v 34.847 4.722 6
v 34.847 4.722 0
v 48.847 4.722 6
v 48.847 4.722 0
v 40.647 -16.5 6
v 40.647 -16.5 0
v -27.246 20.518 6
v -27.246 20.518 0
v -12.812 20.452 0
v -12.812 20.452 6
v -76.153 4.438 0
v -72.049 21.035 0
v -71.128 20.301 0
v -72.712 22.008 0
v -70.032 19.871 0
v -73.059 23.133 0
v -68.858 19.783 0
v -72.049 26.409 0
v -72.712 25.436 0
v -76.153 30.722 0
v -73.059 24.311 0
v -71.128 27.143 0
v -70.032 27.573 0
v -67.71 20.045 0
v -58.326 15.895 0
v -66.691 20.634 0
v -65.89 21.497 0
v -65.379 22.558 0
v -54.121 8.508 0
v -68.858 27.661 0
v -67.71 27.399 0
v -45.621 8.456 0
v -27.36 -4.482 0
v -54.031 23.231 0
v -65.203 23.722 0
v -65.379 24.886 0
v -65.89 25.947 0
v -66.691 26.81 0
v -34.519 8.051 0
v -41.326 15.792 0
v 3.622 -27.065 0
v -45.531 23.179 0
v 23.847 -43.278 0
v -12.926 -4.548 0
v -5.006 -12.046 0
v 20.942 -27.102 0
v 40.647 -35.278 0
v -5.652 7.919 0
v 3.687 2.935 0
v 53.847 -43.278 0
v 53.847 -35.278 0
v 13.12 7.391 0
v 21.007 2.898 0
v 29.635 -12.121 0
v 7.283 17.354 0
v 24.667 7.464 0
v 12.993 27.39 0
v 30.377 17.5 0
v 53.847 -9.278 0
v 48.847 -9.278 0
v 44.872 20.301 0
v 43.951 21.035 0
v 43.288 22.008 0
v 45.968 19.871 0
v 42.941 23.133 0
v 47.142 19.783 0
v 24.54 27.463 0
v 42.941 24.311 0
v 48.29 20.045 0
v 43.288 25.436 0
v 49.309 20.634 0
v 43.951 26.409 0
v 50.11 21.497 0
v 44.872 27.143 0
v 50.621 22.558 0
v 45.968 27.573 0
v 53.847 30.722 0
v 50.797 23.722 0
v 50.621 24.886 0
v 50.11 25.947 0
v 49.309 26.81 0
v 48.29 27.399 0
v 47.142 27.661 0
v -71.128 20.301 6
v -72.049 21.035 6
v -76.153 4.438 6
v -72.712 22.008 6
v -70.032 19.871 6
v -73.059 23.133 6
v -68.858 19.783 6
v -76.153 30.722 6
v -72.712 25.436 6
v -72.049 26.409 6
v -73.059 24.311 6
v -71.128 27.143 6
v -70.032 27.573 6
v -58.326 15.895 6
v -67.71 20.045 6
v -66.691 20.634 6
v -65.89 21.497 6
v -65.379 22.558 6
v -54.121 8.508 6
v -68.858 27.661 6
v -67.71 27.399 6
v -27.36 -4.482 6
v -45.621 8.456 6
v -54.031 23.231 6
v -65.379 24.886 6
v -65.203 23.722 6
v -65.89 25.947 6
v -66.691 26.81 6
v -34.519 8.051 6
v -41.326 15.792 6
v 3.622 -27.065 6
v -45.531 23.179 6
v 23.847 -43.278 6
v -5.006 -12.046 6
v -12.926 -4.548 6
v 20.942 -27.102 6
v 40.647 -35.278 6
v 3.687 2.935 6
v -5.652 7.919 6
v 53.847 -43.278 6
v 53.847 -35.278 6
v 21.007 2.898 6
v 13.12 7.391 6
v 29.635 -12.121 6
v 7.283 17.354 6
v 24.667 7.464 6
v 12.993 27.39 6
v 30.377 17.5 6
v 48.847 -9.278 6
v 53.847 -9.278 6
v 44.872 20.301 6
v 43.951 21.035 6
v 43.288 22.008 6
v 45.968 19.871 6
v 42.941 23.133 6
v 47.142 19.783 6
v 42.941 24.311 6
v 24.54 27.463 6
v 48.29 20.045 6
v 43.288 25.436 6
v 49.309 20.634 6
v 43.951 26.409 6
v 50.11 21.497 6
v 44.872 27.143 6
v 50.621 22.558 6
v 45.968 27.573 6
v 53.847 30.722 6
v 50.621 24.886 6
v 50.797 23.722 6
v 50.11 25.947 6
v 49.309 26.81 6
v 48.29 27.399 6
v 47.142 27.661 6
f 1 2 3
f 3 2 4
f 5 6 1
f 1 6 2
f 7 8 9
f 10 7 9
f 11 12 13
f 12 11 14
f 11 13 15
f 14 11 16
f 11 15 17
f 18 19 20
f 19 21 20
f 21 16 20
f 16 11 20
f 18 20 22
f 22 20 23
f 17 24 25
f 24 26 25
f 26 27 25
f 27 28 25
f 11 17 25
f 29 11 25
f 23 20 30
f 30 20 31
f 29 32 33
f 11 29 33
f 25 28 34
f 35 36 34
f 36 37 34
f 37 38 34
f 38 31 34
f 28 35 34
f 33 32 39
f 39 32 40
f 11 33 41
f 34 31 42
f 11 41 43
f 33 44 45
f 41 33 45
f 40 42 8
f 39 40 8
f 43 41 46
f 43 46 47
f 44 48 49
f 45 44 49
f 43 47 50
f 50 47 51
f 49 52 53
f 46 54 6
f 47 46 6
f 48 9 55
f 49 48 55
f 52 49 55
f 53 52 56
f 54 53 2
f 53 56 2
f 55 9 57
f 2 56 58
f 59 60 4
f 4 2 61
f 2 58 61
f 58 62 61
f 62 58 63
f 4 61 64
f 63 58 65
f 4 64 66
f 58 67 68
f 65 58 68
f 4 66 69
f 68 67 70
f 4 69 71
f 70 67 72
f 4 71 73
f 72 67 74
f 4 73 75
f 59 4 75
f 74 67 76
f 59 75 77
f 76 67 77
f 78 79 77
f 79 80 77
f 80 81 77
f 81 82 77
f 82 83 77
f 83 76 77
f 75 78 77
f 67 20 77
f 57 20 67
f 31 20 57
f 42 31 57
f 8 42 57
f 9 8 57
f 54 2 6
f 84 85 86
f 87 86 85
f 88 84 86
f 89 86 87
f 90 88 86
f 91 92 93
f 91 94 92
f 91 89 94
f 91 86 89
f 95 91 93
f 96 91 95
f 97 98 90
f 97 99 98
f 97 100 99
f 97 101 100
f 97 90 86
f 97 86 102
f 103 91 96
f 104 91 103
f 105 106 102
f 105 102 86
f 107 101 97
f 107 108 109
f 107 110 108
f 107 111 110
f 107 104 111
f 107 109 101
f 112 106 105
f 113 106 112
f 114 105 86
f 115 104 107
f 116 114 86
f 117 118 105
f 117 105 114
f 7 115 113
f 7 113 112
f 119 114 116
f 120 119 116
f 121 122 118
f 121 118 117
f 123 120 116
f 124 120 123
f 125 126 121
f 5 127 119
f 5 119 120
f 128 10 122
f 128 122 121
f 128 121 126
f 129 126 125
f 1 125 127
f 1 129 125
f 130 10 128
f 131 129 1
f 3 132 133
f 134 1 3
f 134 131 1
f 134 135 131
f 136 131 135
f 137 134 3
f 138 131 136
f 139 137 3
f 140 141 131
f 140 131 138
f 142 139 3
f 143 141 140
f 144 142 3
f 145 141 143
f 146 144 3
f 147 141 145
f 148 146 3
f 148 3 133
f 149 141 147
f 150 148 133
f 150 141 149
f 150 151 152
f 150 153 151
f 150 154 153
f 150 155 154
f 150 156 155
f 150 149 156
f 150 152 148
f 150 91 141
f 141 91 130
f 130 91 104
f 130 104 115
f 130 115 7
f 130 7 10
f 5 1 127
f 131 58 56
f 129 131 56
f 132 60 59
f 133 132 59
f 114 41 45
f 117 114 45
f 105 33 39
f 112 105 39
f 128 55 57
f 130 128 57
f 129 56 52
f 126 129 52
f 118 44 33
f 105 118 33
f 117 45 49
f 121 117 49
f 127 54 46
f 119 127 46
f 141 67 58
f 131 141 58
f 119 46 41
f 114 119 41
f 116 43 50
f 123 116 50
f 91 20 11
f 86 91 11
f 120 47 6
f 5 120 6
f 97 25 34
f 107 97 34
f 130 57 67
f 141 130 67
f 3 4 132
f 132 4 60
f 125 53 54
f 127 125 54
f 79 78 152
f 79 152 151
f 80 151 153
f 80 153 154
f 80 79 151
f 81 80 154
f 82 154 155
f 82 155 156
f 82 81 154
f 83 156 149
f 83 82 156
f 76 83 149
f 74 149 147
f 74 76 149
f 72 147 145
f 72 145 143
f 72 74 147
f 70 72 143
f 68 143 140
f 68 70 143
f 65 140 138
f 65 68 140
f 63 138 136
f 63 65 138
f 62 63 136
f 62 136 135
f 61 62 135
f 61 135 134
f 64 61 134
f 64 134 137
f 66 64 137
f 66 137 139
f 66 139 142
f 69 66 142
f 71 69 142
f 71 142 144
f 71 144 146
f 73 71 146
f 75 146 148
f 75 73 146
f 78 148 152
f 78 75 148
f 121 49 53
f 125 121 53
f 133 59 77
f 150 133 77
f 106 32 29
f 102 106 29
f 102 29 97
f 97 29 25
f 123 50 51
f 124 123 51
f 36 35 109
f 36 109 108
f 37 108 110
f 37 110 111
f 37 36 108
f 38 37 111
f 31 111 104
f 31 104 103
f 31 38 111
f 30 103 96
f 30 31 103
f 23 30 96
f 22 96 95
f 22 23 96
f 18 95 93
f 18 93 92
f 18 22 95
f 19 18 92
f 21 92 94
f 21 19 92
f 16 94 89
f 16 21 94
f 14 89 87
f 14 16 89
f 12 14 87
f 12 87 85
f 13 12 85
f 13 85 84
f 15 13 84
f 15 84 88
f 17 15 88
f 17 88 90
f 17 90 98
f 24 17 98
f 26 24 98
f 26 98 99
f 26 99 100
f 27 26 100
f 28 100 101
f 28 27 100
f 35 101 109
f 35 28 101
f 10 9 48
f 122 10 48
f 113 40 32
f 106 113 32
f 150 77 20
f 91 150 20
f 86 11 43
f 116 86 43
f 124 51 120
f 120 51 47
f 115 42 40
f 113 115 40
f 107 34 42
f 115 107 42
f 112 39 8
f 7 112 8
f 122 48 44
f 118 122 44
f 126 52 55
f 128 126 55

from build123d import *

# Parameters (mm, degrees)
F0_R     = 3.95
F1_DEPTH = 6


with BuildPart() as f1:
    # F0 (on Top) → F1 (new body)
    with BuildSketch(Plane.XY):
        Polygon((53.84666, 30.722071), (-76.15334, 30.722071), (-76.15334, 4.438029), (23.84666, -43.277929), (53.84666, -43.277929), (53.84666, -35.277929), (40.64666, -35.277929), (40.64666, -16.499616), (34.84666, 4.722071), (48.84666, 4.722071), (48.84666, -9.277929), (53.84666, -9.277929), align=None)
        Polygon((29.634969, -12.120992), (20.942271, -27.102214), (3.621804, -27.064728), (-5.005966, -12.04602), (3.686731, 2.935202), (21.007199, 2.897716), align=None, mode=Mode.SUBTRACT)
        Polygon((-5.652112, 7.919449), (-12.925933, -4.547502), (-27.359539, -4.481664), (-34.519325, 8.051125), (-27.245504, 20.518076), (-12.811898, 20.452238), align=None, mode=Mode.SUBTRACT)
        Polygon((-41.32622, 15.791604), (-45.621206, 8.456361), (-54.121206, 8.508307), (-58.32622, 15.895495), (-54.031233, 23.230739), (-45.531233, 23.178793), align=None, mode=Mode.SUBTRACT)
        with Locations((-69.15334, 23.722071)):
            Circle(F0_R, mode=Mode.SUBTRACT)
        Polygon((7.283409, 17.353729), (12.993321, 27.390174), (24.540094, 27.463468), (30.376955, 17.500317), (24.667043, 7.463871), (13.12027, 7.390577), align=None, mode=Mode.SUBTRACT)
        with Locations((46.84666, 23.722071)):
            Circle(F0_R, mode=Mode.SUBTRACT)
    extrude(amount=F1_DEPTH)


solid = f1.part
